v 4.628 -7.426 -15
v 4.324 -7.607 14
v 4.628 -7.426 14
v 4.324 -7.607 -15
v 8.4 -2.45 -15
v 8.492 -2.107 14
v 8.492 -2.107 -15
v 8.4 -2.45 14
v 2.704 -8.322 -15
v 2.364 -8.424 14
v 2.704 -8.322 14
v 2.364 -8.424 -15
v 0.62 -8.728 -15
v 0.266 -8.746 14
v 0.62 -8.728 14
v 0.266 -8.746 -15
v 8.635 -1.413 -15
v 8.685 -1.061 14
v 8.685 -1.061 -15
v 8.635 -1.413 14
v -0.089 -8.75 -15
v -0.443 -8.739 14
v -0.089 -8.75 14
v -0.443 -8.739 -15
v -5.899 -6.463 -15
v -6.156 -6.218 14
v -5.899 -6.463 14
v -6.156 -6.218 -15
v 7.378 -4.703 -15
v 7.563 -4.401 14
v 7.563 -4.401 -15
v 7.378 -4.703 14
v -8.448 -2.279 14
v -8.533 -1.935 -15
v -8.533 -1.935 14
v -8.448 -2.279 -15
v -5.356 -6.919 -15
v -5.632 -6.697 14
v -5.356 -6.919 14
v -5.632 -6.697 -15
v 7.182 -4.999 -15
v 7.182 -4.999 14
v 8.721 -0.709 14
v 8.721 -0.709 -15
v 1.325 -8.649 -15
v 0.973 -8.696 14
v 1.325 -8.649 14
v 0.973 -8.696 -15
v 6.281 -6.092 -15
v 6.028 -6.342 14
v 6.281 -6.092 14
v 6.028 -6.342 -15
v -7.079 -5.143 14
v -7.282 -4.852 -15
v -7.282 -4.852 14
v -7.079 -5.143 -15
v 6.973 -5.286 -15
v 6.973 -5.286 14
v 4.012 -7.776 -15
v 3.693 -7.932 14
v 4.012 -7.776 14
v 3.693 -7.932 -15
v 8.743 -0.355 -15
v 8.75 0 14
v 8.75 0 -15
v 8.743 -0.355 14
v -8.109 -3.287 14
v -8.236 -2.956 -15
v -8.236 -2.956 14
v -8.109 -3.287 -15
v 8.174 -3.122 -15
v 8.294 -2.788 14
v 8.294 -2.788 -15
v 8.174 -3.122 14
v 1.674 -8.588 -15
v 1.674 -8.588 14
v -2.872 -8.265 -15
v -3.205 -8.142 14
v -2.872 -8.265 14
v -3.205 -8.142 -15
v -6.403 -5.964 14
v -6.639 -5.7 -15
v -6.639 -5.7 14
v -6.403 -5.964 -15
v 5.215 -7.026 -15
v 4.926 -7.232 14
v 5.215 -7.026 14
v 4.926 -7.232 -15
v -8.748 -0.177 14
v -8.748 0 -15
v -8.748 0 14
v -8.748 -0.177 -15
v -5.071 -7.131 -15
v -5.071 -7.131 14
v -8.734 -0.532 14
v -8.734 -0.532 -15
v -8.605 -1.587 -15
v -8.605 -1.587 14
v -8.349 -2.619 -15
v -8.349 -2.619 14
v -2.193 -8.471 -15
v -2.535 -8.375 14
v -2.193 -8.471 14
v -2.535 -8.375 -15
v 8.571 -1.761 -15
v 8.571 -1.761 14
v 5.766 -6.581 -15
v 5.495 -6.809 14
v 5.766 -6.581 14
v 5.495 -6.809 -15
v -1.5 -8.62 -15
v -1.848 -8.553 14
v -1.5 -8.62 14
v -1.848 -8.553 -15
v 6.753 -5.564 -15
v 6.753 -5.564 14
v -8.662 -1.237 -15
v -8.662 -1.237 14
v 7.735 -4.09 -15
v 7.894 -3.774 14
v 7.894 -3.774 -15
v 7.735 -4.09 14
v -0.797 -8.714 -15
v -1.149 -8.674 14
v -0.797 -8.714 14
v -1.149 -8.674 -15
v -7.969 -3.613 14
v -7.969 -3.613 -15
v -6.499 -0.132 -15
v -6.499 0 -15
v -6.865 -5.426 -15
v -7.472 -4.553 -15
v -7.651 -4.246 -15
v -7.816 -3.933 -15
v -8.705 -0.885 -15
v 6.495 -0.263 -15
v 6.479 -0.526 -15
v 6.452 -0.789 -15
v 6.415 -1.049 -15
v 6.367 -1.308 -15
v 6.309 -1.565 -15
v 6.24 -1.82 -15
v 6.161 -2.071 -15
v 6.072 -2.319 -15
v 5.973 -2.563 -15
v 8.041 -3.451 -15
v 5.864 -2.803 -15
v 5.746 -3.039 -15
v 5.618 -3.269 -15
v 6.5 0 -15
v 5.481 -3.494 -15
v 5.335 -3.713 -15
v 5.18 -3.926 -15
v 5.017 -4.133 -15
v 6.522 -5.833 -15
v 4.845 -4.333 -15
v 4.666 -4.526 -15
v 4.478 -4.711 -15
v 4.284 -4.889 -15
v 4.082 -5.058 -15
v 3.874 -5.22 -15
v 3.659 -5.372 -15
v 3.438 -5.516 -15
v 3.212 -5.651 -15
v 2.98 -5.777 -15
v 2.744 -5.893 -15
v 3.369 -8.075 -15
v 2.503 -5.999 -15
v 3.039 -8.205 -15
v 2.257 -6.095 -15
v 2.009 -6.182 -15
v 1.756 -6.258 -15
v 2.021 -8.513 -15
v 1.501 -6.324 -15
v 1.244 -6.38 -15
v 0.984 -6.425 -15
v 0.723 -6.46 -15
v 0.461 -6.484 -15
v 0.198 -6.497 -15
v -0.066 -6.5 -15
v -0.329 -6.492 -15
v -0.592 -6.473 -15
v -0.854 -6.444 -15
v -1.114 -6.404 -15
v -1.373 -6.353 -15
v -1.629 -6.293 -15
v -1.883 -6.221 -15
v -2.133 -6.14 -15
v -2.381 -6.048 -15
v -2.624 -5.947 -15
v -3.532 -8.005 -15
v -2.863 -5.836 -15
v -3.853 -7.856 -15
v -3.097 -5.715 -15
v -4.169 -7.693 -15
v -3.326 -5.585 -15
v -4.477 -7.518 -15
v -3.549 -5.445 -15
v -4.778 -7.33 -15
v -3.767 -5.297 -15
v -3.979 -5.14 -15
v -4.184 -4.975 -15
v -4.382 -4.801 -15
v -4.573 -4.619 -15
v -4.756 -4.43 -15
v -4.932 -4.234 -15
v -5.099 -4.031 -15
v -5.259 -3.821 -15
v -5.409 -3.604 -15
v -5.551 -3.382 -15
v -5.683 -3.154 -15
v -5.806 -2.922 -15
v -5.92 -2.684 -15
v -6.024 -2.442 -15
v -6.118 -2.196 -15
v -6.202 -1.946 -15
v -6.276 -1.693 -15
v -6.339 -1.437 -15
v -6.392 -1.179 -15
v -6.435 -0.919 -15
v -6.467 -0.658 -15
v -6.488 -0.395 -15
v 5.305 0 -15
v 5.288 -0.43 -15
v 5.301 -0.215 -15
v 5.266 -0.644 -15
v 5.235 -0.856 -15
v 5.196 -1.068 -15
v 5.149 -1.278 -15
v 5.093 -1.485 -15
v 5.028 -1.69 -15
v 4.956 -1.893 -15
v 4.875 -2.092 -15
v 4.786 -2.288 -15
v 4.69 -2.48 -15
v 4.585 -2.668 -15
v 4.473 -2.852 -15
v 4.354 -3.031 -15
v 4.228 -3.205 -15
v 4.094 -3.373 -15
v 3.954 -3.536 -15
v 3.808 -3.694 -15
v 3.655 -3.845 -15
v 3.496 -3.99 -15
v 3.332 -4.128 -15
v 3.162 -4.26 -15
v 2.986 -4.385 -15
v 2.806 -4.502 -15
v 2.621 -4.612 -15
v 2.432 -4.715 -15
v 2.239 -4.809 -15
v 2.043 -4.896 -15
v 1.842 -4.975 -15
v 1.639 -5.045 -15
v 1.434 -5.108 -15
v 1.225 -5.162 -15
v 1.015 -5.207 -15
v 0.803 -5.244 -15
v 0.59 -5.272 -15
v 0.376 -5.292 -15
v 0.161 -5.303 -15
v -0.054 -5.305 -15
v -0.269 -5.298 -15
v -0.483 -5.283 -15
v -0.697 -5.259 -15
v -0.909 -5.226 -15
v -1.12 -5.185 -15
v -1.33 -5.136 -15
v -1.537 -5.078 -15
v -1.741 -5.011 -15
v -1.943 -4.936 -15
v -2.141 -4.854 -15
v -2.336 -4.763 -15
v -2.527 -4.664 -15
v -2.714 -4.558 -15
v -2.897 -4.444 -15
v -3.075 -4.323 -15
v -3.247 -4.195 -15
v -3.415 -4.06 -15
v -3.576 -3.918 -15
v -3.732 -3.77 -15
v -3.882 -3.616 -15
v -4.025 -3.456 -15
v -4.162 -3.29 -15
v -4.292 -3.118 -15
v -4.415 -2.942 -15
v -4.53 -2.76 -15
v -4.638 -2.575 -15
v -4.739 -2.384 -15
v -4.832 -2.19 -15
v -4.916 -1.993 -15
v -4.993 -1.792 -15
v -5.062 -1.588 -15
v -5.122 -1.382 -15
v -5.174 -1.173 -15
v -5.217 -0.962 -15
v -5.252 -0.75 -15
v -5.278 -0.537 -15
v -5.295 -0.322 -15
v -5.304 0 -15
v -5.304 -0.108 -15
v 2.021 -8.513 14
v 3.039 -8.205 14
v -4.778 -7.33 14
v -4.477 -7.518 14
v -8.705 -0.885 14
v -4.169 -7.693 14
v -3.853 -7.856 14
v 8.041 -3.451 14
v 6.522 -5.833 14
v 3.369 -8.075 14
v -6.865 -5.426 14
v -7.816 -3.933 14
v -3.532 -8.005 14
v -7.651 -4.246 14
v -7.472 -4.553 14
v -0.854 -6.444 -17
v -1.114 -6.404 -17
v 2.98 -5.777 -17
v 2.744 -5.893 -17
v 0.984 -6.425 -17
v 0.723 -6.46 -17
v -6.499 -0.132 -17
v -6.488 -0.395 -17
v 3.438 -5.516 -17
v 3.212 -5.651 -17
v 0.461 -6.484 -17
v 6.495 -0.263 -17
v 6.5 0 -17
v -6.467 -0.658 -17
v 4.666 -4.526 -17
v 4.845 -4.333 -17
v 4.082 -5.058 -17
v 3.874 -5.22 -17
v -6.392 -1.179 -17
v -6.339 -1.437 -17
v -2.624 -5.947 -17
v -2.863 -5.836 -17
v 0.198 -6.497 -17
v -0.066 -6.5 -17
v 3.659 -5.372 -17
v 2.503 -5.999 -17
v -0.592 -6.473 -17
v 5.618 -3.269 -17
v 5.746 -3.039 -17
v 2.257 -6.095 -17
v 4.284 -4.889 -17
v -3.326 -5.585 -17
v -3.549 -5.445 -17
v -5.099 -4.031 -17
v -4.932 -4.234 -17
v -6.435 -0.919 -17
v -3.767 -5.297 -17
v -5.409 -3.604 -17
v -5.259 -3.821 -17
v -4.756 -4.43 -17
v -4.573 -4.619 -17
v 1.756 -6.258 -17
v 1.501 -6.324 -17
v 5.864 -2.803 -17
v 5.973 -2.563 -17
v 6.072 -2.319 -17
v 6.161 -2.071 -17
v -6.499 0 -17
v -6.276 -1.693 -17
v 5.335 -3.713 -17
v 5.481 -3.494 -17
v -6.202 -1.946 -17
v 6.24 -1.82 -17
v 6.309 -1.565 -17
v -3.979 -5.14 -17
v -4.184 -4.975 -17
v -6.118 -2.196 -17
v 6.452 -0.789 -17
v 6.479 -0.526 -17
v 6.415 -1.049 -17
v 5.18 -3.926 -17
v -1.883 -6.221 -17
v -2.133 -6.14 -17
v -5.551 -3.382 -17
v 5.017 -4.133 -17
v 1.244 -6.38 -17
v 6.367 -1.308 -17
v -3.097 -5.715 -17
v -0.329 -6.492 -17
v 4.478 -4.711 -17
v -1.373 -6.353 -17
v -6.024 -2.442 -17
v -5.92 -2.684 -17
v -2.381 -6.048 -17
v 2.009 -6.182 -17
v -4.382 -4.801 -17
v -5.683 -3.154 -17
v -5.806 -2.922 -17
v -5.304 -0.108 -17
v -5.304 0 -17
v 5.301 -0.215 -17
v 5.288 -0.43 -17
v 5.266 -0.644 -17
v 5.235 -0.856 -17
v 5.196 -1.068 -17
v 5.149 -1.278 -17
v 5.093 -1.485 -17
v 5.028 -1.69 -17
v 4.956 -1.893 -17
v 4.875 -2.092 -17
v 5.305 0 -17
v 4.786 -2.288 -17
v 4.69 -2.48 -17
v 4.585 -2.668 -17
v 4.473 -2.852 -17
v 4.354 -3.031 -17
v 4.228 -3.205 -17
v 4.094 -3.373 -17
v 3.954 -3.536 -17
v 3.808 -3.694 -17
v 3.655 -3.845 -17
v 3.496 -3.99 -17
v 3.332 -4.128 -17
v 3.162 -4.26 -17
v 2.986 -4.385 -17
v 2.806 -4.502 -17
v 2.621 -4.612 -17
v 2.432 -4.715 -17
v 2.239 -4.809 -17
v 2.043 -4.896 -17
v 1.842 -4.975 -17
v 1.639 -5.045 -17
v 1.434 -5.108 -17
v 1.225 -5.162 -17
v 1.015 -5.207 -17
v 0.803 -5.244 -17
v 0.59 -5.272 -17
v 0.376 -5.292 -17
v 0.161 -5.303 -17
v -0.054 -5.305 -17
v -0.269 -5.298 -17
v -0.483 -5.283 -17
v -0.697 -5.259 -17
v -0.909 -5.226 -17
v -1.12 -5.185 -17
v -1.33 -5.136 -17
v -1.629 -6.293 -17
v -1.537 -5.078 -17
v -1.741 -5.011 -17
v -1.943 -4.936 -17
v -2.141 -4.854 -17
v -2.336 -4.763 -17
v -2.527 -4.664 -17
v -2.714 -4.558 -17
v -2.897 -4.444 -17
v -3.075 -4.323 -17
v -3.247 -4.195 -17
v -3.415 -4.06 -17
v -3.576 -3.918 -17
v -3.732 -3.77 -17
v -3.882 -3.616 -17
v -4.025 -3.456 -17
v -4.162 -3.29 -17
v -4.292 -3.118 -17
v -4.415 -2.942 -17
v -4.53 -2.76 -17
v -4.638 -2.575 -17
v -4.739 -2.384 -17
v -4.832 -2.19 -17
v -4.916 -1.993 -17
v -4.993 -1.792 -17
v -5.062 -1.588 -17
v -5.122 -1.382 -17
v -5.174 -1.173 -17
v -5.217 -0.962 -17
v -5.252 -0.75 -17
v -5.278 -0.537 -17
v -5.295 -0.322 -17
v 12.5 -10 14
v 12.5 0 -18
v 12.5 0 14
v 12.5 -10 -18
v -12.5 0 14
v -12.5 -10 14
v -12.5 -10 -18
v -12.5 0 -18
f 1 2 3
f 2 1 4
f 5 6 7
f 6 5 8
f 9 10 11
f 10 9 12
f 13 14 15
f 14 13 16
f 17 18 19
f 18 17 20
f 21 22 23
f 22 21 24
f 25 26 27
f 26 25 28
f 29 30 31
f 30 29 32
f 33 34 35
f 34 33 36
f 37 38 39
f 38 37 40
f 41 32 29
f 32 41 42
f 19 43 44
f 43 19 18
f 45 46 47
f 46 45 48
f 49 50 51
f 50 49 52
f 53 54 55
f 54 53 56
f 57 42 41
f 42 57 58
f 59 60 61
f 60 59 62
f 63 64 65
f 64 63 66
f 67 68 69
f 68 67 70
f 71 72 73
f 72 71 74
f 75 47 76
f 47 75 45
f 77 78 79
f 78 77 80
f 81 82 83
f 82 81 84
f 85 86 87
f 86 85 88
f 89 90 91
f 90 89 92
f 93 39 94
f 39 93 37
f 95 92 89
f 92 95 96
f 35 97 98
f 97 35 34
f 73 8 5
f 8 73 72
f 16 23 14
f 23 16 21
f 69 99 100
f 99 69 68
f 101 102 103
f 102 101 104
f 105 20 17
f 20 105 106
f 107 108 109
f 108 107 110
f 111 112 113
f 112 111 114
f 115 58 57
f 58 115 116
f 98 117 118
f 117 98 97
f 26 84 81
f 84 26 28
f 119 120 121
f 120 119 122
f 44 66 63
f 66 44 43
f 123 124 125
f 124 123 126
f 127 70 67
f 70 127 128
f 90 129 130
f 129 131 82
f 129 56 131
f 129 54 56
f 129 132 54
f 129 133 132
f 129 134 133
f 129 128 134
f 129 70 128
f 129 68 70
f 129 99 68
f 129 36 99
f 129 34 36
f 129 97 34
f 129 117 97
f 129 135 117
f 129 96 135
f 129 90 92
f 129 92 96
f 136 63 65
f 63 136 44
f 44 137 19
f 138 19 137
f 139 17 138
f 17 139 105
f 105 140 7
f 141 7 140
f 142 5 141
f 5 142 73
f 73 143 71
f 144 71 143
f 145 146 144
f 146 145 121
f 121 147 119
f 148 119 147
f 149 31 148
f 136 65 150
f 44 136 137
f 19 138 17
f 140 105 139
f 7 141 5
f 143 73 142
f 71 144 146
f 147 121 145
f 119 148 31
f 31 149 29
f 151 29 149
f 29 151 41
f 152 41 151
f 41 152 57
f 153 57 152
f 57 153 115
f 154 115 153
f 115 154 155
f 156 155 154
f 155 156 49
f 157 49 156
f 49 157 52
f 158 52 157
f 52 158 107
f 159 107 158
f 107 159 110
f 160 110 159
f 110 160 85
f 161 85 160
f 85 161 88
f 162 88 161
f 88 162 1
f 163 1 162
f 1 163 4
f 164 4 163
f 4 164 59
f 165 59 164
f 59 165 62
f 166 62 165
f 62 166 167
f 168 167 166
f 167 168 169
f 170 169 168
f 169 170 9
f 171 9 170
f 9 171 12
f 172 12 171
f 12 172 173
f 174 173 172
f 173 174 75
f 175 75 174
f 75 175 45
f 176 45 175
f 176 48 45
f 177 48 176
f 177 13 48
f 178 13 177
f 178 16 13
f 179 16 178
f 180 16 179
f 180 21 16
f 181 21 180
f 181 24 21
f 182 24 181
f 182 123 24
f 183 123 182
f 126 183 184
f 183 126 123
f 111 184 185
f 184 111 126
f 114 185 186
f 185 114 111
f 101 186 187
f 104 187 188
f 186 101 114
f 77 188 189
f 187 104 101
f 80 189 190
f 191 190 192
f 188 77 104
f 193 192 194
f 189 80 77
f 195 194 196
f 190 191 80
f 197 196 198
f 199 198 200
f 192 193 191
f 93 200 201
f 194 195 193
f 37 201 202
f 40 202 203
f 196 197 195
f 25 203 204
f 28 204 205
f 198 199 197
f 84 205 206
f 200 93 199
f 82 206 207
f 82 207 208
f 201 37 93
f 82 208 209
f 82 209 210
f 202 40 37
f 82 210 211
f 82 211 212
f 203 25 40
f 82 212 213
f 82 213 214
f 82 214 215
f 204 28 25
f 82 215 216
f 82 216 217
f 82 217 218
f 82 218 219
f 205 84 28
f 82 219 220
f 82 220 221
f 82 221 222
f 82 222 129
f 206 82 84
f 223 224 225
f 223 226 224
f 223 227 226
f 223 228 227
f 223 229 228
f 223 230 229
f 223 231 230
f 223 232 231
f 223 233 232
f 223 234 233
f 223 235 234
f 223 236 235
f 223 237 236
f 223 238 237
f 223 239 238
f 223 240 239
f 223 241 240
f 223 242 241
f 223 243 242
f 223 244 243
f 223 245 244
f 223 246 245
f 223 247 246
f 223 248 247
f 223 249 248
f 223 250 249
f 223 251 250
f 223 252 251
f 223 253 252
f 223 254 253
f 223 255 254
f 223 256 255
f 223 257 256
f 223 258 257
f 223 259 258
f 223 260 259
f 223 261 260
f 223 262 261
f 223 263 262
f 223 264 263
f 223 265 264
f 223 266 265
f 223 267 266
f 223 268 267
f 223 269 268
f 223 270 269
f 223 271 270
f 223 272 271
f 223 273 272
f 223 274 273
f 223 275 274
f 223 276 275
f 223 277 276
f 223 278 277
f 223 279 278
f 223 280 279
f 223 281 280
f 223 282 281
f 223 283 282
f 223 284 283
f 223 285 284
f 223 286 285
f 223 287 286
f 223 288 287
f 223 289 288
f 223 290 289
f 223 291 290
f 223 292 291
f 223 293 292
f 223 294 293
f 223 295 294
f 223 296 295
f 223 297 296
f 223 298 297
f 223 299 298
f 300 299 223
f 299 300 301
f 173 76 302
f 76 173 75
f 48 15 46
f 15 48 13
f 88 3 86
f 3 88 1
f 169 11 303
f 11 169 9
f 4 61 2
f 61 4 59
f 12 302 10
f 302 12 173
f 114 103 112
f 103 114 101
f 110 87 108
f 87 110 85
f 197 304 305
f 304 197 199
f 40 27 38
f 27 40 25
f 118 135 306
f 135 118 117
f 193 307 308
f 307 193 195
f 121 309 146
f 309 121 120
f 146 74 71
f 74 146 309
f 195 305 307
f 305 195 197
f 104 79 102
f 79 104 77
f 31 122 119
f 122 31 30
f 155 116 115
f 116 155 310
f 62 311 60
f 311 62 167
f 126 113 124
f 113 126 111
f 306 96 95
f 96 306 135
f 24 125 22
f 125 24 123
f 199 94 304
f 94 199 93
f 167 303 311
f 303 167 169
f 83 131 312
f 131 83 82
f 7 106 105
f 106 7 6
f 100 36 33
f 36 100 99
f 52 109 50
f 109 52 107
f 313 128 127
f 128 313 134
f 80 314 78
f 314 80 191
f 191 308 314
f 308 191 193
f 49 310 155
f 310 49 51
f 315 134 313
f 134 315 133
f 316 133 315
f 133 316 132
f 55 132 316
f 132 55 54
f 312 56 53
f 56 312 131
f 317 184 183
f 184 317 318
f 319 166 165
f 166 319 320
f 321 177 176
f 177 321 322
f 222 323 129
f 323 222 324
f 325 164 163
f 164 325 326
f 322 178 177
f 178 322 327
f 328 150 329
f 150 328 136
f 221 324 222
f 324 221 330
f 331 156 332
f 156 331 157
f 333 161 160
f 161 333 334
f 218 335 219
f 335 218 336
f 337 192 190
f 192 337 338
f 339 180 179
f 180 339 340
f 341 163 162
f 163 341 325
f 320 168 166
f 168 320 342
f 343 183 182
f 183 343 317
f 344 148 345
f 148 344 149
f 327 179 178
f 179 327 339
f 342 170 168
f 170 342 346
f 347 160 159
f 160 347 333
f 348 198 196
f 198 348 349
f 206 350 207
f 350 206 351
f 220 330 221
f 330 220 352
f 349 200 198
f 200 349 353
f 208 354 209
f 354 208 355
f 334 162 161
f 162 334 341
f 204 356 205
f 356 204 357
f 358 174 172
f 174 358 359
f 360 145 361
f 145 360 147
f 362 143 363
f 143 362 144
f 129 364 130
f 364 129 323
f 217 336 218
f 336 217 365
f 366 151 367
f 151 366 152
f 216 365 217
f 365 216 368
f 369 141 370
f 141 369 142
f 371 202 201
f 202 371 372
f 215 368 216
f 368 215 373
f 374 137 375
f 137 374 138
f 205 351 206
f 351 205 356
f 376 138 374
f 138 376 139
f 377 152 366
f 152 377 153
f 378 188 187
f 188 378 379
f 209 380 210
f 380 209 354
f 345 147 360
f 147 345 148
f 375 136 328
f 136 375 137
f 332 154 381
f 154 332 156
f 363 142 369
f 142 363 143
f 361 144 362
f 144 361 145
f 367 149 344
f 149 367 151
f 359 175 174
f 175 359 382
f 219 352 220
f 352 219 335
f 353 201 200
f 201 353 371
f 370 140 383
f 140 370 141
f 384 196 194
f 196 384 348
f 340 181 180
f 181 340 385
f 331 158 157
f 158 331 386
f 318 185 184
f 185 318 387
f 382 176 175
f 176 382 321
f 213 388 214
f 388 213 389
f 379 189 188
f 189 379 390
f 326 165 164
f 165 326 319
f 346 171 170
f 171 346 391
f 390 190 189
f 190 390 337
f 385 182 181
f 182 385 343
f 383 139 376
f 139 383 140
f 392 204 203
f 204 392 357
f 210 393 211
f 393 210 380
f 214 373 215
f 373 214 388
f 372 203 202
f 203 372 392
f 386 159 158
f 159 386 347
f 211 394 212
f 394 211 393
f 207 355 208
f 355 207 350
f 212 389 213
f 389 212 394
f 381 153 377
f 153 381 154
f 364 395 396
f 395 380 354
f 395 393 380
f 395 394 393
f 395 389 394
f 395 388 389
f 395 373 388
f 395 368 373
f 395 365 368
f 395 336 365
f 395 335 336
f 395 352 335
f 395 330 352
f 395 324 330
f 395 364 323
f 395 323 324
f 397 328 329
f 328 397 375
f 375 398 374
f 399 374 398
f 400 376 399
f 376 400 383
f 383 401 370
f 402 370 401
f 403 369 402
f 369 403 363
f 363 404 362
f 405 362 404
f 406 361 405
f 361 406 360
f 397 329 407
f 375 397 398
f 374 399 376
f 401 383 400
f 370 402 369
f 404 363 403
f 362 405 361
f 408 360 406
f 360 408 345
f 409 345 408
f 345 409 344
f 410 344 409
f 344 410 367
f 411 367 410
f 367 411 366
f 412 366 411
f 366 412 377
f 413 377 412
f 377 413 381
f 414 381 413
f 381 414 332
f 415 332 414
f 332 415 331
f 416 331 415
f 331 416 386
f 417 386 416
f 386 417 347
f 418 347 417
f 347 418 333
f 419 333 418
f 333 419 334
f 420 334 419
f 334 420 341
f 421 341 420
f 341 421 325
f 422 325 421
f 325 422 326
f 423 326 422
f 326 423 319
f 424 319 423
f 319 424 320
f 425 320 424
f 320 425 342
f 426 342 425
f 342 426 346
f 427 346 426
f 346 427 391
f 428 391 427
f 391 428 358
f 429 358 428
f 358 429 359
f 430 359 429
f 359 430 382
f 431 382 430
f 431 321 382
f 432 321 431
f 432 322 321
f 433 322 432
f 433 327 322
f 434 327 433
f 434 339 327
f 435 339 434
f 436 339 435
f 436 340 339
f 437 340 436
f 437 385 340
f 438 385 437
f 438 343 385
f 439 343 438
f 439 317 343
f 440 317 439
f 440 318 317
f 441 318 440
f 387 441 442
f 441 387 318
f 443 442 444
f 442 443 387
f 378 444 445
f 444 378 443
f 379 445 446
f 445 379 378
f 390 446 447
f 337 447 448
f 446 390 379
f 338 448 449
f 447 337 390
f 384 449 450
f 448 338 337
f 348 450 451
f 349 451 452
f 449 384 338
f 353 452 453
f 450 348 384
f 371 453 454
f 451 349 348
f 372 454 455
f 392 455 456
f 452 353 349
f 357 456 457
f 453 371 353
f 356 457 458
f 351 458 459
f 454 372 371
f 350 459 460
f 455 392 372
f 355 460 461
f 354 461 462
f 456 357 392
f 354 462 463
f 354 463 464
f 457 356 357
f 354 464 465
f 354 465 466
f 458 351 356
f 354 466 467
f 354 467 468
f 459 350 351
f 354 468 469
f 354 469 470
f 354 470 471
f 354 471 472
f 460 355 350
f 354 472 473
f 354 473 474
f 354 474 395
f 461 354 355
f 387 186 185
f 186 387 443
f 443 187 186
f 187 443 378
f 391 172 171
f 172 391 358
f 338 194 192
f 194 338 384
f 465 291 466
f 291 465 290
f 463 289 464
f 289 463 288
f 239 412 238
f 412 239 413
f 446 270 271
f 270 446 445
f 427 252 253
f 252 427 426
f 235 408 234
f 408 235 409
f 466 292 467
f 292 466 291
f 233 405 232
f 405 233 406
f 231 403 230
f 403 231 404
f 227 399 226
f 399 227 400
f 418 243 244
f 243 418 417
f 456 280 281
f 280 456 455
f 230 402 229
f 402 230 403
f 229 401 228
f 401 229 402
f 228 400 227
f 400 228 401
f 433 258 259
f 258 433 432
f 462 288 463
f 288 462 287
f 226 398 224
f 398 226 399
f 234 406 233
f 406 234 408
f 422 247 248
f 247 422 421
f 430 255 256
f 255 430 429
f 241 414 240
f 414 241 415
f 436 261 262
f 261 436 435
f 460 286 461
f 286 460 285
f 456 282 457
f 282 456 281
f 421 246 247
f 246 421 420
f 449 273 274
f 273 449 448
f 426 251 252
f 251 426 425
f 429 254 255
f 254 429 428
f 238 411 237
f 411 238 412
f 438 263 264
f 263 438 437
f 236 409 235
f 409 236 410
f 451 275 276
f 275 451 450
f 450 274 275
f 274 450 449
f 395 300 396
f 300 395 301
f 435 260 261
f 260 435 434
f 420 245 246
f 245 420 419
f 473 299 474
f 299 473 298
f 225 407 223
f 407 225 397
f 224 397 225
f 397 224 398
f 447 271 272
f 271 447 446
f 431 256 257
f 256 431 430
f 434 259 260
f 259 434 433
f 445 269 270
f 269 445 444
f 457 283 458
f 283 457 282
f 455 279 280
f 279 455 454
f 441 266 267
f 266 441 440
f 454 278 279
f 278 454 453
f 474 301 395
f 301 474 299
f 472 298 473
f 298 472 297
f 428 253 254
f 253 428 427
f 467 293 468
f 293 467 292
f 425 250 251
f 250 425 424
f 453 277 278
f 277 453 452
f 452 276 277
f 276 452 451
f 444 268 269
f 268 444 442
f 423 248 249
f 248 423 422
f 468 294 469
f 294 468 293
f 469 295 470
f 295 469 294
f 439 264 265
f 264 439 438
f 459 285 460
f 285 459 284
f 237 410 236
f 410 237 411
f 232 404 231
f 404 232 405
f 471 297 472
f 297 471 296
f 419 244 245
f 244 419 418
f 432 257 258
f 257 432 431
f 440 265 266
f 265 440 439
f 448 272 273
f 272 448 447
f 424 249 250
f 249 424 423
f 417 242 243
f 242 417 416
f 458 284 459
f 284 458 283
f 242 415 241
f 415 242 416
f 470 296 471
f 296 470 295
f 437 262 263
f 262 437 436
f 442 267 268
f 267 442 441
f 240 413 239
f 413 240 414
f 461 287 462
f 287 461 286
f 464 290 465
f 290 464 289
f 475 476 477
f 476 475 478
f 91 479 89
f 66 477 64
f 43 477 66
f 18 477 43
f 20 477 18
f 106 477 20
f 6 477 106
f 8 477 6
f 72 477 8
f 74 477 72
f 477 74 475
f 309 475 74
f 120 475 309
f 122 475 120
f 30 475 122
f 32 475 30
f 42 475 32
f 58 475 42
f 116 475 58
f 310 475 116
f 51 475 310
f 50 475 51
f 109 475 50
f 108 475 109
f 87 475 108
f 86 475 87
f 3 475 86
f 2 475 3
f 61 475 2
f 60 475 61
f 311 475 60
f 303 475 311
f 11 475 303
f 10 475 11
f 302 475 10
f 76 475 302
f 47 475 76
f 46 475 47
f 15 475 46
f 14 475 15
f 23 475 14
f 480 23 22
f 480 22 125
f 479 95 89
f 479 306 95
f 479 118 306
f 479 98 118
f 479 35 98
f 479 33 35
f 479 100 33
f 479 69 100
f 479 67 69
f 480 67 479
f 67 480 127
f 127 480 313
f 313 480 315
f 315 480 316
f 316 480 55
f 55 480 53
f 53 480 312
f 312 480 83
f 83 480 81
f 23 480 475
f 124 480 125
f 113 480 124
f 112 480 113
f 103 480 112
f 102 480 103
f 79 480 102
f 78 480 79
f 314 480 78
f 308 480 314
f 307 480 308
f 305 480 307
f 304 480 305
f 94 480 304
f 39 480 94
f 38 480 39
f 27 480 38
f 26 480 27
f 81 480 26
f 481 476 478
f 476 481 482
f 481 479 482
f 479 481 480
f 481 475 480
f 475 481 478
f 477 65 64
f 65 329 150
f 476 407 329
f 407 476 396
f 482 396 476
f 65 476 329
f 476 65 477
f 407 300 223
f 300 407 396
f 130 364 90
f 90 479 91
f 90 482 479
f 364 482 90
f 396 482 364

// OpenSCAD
$fn=155;

module glass() {
   difference() {
      cylinder(h=30,d=13.00,center=true);
      cylinder(h=32,d=10.61,center=true);
   }
}

module sheath() {
   color("Red") difference() {
      cylinder(h=30,d=17.50,center=true);
      cylinder(h=32,d=13.02,center=true);
   }   
}

module displacer() {
      cylinder(h=32,d=13.02,center=true);
}

%glass();
difference() {
   translate([0,0,-2]) cube([25,20,32],center=true);
   translate([0,0,0]) sheath();
   translate([0,16,-2]) cube([27,32,35],center=true);
   translate([0,0,1]) cylinder(h=32,d=14,center=true);
   color("Green") translate([0,0,-2]) glass();
}

//color("Green") translate([0,0,0]) glass();
